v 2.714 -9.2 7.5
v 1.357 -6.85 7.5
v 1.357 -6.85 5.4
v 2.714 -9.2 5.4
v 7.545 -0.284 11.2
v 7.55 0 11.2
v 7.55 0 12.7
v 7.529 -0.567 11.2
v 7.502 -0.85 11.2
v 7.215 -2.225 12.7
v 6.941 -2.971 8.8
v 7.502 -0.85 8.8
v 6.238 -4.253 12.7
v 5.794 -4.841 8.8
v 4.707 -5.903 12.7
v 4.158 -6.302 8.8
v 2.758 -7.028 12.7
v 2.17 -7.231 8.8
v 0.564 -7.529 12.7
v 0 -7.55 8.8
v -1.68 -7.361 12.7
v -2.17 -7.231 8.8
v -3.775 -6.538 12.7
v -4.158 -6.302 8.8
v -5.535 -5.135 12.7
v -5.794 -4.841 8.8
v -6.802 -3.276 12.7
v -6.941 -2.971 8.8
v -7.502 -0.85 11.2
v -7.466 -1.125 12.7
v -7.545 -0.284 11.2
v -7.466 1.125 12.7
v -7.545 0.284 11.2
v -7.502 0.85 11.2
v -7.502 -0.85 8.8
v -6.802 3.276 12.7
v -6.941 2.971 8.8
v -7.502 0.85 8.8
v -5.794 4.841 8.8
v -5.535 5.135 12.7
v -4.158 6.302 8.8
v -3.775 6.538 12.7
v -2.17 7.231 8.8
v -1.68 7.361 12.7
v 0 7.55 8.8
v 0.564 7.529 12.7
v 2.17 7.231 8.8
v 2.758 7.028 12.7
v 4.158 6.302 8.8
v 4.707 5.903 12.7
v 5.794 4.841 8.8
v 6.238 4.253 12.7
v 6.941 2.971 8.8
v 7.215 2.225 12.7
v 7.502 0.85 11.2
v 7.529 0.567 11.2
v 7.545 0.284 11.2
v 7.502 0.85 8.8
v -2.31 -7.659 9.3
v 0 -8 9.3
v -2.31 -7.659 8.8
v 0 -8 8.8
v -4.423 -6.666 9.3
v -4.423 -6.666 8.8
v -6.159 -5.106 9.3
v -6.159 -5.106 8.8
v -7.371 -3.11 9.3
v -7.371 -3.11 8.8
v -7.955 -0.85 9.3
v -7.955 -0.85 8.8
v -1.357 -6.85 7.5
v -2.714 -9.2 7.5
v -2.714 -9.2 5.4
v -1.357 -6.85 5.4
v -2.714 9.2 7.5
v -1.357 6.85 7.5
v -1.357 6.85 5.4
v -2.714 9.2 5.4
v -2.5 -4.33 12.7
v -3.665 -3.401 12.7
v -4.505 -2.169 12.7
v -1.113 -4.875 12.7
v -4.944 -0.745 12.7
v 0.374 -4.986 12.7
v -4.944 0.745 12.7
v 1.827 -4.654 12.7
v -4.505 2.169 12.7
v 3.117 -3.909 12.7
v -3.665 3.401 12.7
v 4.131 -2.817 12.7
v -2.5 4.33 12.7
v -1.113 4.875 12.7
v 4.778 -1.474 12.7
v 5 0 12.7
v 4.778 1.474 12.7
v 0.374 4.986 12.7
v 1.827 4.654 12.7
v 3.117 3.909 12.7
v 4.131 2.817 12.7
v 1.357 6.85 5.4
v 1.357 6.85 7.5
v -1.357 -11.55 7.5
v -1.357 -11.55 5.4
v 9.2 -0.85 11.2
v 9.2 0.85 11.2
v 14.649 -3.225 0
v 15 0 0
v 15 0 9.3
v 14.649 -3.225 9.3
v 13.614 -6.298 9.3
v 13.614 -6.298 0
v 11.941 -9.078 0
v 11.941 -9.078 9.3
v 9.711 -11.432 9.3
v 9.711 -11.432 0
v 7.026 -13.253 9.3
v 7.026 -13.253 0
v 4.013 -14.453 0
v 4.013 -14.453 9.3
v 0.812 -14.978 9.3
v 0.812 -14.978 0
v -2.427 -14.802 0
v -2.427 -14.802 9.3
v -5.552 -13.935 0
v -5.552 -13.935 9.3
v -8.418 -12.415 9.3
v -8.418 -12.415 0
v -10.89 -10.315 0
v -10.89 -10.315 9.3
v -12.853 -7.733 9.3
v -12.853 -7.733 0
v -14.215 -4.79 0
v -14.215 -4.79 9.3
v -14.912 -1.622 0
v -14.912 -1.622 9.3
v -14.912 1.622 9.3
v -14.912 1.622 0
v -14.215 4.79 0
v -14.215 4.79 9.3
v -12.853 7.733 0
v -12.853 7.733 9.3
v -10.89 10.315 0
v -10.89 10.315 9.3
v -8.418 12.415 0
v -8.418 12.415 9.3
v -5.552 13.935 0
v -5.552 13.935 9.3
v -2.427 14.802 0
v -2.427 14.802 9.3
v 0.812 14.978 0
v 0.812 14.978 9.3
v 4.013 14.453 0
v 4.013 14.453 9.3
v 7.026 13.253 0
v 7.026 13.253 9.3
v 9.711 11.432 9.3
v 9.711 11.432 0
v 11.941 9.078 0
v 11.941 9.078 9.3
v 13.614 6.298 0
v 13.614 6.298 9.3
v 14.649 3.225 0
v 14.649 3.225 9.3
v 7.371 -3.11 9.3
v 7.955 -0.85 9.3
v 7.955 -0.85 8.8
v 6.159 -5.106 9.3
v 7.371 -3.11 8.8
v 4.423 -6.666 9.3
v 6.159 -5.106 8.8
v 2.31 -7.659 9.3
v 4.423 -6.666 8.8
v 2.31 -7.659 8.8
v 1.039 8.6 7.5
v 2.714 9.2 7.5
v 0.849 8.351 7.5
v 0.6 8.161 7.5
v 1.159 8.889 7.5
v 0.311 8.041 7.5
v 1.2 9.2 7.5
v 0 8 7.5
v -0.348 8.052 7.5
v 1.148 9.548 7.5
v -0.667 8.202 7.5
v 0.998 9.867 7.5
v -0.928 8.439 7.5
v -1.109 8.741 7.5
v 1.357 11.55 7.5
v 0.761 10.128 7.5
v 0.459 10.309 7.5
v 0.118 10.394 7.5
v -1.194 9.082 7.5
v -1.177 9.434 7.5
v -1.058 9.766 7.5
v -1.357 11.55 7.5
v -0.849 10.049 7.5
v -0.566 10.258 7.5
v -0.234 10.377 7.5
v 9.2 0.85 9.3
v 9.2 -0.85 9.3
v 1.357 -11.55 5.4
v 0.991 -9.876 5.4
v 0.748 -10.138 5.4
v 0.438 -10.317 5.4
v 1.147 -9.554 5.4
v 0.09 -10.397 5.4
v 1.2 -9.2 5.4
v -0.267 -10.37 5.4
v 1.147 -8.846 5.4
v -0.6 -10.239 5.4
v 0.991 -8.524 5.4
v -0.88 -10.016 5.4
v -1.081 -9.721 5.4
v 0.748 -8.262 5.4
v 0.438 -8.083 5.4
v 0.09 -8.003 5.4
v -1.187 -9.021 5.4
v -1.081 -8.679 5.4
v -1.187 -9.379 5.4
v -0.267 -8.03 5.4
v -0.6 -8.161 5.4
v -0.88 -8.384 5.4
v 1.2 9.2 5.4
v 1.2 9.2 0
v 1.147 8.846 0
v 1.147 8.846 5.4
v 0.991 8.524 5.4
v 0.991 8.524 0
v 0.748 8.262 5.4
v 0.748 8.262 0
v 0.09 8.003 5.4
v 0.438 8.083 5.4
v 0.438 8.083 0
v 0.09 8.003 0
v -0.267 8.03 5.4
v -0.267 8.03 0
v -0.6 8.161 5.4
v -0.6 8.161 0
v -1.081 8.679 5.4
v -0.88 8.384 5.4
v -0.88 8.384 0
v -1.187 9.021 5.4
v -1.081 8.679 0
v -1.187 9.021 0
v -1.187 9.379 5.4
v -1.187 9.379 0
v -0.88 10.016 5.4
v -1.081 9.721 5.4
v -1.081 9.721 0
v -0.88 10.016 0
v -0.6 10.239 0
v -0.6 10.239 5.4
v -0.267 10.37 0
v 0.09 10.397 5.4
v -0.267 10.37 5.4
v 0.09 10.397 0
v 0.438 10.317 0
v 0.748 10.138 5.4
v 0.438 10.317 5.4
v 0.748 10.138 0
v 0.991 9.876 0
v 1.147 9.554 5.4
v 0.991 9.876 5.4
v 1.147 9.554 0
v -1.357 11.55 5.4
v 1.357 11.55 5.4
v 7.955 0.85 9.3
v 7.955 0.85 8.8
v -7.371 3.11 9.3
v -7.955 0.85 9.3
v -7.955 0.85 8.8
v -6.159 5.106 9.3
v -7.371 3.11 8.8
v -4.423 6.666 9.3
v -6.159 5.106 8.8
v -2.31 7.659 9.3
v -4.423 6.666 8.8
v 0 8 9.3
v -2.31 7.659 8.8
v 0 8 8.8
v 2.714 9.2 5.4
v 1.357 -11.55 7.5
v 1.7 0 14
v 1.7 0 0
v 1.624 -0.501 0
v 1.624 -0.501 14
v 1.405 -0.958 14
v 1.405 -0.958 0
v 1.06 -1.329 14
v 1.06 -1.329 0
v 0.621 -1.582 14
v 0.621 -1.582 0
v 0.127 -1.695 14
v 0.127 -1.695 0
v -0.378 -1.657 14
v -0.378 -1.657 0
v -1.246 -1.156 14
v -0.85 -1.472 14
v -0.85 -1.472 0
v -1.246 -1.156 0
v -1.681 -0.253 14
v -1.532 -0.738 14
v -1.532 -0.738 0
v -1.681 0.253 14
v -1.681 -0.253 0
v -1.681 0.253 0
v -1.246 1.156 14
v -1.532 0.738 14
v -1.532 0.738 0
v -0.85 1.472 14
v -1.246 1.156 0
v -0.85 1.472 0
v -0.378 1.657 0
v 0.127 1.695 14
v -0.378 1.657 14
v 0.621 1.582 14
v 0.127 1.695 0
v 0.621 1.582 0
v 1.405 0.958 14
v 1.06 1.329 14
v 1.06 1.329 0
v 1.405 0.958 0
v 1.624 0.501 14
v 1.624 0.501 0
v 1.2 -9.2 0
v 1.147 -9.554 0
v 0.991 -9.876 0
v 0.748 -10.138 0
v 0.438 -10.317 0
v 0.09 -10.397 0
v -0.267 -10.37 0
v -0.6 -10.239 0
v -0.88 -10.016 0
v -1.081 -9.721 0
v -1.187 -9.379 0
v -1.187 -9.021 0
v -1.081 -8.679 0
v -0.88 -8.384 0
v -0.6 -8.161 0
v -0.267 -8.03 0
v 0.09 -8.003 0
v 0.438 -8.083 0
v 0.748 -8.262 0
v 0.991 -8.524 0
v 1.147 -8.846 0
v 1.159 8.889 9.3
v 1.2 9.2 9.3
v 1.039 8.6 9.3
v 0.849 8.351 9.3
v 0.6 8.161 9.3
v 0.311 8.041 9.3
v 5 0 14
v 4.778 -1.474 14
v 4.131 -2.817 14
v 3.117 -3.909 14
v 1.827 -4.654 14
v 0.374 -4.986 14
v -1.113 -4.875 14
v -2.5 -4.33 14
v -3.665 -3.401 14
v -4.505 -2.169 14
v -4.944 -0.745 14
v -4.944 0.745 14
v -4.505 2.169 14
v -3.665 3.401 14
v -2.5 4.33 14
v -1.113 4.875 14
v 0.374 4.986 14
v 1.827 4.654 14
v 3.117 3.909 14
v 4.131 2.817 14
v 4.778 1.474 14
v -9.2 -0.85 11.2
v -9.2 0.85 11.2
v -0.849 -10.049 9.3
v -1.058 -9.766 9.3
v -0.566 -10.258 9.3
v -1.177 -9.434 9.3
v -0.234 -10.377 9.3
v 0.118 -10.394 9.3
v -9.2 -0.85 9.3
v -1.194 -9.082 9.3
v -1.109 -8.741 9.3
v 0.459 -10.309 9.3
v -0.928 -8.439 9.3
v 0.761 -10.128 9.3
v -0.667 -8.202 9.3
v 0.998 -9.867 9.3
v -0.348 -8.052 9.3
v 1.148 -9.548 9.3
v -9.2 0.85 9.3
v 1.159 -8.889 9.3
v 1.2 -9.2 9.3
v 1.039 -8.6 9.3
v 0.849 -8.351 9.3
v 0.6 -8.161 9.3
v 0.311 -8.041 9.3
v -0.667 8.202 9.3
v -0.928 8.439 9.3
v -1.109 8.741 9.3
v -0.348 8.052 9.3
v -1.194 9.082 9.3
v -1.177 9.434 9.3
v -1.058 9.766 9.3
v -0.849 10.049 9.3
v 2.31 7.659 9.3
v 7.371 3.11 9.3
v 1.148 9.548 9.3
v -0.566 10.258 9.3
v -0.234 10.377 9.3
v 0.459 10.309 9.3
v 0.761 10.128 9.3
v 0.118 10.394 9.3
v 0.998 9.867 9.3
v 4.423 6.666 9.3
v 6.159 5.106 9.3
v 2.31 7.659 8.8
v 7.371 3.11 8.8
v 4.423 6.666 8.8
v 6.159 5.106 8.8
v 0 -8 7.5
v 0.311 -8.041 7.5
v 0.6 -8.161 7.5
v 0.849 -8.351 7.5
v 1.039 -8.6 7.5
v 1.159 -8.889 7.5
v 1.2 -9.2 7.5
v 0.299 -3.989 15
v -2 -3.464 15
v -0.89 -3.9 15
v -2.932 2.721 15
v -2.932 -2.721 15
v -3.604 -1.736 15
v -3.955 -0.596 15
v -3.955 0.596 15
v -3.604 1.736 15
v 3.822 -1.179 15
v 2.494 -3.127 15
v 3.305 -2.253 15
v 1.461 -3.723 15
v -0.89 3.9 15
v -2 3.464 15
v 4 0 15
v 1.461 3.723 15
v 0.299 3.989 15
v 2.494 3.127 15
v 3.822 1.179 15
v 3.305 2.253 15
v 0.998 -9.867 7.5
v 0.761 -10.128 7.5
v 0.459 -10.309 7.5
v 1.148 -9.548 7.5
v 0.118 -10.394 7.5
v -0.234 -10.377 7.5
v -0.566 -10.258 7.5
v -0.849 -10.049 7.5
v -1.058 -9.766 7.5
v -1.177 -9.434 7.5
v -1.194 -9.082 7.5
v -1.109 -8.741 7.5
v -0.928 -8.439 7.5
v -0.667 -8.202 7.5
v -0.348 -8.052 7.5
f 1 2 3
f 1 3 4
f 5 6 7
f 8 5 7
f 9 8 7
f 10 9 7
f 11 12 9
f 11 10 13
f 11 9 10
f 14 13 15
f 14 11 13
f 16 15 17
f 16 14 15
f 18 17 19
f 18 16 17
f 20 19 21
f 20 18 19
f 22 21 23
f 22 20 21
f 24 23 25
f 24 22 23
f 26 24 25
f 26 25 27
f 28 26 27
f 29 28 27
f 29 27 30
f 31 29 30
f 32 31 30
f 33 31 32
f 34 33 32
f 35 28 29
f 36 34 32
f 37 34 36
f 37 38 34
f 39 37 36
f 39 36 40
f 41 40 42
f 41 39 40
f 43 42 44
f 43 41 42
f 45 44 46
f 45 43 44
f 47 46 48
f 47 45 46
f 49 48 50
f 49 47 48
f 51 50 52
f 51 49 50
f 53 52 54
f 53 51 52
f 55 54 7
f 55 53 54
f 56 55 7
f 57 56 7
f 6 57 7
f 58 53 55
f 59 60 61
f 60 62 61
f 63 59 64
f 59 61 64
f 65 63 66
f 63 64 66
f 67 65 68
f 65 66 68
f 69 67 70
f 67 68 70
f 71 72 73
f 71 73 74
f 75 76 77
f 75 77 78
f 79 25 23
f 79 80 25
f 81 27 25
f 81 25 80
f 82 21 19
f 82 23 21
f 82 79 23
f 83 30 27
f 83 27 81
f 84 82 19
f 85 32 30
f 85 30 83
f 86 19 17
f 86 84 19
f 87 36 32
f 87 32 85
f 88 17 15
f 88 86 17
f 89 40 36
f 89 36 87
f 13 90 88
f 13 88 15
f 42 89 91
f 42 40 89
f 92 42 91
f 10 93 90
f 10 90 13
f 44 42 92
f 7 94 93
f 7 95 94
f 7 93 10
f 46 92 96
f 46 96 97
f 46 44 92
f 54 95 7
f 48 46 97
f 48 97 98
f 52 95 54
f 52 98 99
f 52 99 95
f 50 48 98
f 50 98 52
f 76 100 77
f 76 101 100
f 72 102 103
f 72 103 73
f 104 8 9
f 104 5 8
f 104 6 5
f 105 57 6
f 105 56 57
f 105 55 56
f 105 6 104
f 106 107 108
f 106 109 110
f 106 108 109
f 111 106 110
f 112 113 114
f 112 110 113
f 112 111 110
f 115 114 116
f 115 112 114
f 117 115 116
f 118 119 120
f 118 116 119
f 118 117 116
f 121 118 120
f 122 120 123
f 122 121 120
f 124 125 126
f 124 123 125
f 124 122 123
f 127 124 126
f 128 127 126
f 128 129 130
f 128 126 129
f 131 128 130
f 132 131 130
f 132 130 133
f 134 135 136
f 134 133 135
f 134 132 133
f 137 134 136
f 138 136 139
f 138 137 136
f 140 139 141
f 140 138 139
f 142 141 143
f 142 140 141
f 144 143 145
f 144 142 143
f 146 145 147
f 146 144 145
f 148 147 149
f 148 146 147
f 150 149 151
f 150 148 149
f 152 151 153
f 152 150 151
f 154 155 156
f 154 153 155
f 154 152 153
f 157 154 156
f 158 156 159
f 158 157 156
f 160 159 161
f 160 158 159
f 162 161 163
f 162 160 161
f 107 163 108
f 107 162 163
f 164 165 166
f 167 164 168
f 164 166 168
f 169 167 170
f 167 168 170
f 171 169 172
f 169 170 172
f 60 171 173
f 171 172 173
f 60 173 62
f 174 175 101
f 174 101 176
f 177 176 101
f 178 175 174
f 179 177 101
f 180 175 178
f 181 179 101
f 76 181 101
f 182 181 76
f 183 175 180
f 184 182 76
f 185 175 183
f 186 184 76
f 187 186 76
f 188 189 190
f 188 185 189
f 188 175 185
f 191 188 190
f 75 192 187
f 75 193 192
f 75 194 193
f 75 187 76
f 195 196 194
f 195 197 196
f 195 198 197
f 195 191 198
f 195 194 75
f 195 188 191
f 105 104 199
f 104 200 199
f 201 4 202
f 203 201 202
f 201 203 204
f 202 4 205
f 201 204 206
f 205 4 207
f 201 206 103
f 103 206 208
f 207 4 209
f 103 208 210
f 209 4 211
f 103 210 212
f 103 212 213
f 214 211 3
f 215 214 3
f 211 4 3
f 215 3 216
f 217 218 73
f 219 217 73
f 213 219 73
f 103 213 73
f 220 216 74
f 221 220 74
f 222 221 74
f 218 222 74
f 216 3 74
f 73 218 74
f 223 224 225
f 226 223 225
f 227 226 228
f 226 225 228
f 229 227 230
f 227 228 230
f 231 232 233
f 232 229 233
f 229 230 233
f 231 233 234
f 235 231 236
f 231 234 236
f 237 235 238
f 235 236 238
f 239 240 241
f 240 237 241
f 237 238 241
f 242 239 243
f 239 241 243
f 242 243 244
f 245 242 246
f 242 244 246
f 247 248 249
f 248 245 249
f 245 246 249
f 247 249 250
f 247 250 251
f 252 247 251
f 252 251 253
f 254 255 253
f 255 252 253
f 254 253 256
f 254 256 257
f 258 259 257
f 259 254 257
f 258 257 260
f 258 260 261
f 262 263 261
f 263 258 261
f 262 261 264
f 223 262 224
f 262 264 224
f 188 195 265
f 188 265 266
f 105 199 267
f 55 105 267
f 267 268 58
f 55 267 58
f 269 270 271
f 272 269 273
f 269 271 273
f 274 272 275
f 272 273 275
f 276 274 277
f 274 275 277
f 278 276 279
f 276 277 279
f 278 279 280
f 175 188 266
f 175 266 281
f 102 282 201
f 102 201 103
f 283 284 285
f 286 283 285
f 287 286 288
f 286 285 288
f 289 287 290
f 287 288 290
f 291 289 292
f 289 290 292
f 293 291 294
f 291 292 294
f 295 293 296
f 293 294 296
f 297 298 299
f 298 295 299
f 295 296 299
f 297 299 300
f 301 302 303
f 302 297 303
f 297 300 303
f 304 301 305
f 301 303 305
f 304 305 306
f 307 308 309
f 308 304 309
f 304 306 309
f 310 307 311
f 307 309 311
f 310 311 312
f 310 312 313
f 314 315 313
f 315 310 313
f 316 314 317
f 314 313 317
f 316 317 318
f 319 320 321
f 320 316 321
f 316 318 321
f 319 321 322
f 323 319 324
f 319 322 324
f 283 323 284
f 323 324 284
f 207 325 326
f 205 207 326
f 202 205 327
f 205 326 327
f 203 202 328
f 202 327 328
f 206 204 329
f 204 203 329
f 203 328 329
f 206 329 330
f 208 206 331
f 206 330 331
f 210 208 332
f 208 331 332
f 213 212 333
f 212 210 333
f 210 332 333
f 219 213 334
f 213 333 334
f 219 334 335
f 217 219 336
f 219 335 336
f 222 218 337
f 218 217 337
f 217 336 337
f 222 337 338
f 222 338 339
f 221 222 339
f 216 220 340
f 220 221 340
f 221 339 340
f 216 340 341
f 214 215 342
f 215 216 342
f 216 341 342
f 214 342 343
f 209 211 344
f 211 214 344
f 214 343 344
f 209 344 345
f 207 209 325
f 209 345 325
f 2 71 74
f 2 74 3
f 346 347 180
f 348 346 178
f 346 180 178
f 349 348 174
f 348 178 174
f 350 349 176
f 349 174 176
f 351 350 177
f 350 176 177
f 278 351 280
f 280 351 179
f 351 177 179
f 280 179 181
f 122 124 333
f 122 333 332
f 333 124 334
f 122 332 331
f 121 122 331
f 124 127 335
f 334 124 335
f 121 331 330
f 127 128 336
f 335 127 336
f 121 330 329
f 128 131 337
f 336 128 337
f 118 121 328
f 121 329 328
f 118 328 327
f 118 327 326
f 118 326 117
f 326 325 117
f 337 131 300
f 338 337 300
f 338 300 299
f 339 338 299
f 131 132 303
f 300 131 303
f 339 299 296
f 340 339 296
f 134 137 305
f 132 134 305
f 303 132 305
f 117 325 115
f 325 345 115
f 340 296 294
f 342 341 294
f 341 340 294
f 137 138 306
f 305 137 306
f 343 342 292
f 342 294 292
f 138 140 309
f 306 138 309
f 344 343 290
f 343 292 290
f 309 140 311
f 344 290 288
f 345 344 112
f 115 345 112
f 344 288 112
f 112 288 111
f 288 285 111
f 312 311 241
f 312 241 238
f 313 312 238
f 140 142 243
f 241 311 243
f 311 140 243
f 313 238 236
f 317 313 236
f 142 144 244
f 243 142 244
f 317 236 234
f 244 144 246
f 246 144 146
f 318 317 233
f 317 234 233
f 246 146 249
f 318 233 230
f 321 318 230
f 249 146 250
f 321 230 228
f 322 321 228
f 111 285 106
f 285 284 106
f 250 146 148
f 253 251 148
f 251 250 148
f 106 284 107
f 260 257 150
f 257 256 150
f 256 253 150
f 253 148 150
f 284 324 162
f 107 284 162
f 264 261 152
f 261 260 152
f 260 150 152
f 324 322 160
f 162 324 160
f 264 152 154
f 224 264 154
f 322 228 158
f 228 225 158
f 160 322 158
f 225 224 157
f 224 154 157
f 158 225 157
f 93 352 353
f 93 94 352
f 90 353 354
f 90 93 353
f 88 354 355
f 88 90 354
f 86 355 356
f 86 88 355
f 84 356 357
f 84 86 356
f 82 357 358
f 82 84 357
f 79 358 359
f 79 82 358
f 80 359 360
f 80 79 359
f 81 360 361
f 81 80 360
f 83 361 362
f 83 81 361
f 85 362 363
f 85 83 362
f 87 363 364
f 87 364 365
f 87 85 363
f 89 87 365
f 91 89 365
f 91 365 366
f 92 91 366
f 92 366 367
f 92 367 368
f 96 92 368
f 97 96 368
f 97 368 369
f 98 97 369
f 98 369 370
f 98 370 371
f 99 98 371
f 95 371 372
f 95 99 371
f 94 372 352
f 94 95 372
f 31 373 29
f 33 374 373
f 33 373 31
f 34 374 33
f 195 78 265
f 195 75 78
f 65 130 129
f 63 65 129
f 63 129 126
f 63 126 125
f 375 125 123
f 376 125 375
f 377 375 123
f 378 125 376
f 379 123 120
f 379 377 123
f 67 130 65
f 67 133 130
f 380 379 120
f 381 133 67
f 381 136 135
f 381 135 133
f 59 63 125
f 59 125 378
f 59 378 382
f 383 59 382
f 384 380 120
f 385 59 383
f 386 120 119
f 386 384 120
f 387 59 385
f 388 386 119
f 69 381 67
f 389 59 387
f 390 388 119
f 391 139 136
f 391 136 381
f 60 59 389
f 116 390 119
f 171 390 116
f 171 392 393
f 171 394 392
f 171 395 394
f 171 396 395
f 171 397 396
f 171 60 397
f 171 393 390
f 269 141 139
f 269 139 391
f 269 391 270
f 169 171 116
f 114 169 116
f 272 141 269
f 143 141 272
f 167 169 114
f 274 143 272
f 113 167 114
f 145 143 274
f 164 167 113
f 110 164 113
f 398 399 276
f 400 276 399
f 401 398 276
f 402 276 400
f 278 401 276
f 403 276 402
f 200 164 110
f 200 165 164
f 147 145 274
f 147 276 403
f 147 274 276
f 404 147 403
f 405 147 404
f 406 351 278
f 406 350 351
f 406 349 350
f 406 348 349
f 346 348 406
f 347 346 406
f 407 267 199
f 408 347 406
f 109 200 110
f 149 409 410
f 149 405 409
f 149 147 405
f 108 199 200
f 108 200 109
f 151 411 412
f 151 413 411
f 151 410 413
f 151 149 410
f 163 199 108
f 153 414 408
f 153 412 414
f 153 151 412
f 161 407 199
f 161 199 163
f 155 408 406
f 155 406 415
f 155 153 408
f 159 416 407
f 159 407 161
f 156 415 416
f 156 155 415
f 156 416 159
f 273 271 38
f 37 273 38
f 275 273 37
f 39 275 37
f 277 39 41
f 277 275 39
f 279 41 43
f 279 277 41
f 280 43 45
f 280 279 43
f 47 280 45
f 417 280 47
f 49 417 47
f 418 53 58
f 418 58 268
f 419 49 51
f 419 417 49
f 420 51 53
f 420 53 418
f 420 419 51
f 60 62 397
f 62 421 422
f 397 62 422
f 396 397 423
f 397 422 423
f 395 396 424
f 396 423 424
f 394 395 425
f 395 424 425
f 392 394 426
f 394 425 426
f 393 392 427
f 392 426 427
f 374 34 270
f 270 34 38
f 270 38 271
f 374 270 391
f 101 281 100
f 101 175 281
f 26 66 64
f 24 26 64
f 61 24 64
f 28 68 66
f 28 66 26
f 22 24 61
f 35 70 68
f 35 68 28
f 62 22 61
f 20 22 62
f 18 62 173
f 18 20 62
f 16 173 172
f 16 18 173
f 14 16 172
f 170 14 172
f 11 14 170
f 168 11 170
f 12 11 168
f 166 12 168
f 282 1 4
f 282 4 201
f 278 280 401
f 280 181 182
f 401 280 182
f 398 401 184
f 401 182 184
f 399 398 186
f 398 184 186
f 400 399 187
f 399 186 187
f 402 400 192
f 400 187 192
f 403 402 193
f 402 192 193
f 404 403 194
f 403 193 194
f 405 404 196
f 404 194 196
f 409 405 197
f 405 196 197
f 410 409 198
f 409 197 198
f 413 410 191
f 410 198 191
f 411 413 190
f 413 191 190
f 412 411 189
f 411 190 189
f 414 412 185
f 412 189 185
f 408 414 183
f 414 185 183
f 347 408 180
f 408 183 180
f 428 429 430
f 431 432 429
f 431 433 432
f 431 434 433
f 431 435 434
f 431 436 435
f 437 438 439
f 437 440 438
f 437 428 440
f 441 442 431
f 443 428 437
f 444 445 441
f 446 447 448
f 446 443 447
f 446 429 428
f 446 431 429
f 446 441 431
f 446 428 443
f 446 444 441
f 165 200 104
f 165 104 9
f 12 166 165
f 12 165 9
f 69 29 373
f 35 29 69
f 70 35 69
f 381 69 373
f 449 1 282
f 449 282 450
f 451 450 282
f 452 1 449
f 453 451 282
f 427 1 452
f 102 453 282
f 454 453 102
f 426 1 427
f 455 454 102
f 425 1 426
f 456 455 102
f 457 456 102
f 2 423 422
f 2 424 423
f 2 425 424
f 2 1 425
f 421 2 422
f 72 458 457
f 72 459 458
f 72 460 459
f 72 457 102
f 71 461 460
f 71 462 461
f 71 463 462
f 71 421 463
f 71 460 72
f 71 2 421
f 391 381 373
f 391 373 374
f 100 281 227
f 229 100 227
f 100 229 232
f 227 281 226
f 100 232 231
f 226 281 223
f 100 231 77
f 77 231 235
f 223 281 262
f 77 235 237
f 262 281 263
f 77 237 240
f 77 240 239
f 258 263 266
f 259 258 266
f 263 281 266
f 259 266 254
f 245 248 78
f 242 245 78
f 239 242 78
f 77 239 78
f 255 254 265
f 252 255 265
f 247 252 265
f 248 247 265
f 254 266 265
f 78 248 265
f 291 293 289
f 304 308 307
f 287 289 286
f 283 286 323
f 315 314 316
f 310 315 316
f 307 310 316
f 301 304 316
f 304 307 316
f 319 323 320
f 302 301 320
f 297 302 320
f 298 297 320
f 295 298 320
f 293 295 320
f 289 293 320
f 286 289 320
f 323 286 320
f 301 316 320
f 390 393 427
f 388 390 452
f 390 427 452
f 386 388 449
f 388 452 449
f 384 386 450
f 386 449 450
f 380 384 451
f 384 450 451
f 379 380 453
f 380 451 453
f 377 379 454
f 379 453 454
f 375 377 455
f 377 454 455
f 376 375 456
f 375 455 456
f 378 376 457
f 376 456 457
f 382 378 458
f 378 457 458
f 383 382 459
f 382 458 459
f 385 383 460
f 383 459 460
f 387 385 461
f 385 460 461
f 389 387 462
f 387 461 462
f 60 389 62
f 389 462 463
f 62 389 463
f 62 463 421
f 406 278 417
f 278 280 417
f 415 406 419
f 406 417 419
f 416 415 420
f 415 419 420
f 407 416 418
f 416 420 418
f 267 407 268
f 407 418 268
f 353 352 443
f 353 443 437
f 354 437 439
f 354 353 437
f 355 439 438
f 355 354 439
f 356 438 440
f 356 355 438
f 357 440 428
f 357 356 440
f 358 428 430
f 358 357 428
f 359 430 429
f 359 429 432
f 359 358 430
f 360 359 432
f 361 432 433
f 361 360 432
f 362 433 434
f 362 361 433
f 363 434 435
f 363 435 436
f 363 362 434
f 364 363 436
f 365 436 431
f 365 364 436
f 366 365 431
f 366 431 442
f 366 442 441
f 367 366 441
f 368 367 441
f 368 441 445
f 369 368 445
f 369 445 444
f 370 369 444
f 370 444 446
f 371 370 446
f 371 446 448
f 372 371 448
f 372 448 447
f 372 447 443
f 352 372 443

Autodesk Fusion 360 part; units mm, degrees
sketch "Skizze1" plane through (0, 0, 0) normal (0, 0, 1) x (1, 0, 0)
  circle A0 centre (0, 0) radius 15
  circle A1 centre (0, 0) radius 1.7
  circle A2 centre (0, 0) radius 7.55
  line L0 (0, 17.9163) -> (0, -17.3071) construction
  circle A3 centre (0, 0) radius 9.2 construction
  circle A4 centre (0, 9.2) radius 1.2
  circle A5 centre (0, -9.2) radius 1.2
  circle A6 centre (0, 0) radius 5
  circle A7 centre (0, 0) radius 14.1421 construction
  line L1 (9.2, -0.85) -> (7.502, -0.85)
  line L2 (9.2, 0.85) -> (7.502, 0.85)
  line L3 (19.7442, 0) -> (-23.5704, 0) construction
  line L4 (-4.9272, -0.85) -> (-9.2, -0.85)
  line L5 (-4.9272, 0.85) -> (-9.2, 0.85)
  line L6 (-9.2, -0.85) -> (-9.2, 0.85)
  line L7 (9.2, -0.85) -> (9.2, 0.85)
  circle A8 centre (0, 0) radius 8
  point P0 (0, 9.2)
  point P1 (0, -9.2)
  dimension "d1" = 30
  dimension "d2" = 3.4
  dimension "d3" = 15.1
  dimension "d19" = 18.4
  dimension "d20" = 2.4
  dimension "d21" = 2.4
  dimension "d25" = 10
  dimension "d43" = 28.2843
  dimension "d58" = 0.85
  dimension "d59" = 0.85
  dimension "d60" = 0.85
  dimension "d61" = 0.85
  dimension "d62" = 9.2
  dimension "d63" = 9.2
  dimension "d66" = 16
extrude "Extrusion1" add sketch "Skizze1" along normal blind 15 contours A1 | A6 makes body 1
extrude "Extrusion2" cut sketch "Skizze1" along normal blind 14 contours A1 bodies 1
extrude "Extrusion5" add sketch "Skizze1" along normal blind 12.7 contours A2 A6 L4 L5 | A2 A6 L4 L5 bodies 1
extrude "Extrusion9" add sketch "Skizze1" along normal blind 11.2 contours A2 L1 L2 A8 | A2 L4 L5 A8 | L1 L2 L7 A8 | L4 L5 L6 A8 bodies 1
extrude "Extrusion3" add sketch "Skizze1" along normal blind 9.3 separate body contours A0 | A2 L1 L2 A8 | A2 L4 L5 A8 | L1 L2 L7 A8 | L4 L5 L6 A8 makes body 2
extrude "Extrusion10" add sketch "Skizze1" along normal blind 8.8 contours A2 L2 L5 A8 | A2 L1 L4 A8 bodies 1 2
ref_plane "Arbeitsebene1" through (0, 0, 7.5) normal (0, 0, -1) x (-1, 0, 0)
sketch "Skizze2" plane through (0, 0, 7.5) normal (0, 0, -1) x (-1, 0, 0)
  line L0 (0, 19.4975) -> (0, -17.4097) construction
  line L1 (-20.2047, 0) -> (24.515, 0) construction
  circle A0 centre (0, 0) radius 9.2 construction
  line L2 (-1.3568, 11.55) -> (-2.7135, 9.2)
  line L3 (-2.7135, 9.2) -> (-1.3568, 6.85)
  line L4 (-1.3568, 6.85) -> (1.3568, 6.85)
  line L5 (1.3568, 6.85) -> (2.7135, 9.2)
  line L6 (2.7135, 9.2) -> (1.3568, 11.55)
  line L7 (1.3568, 11.55) -> (-1.3568, 11.55)
  line L8 (1.3568, -11.55) -> (2.7135, -9.2)
  line L9 (2.7135, -9.2) -> (1.3568, -6.85)
  line L10 (1.3568, -6.85) -> (-1.3568, -6.85)
  line L11 (-1.3568, -6.85) -> (-2.7135, -9.2)
  line L12 (-2.7135, -9.2) -> (-1.3568, -11.55)
  line L13 (-1.3568, -11.55) -> (1.3568, -11.55)
  point P0 (0, 9.2)
  point P1 (0, -9.2)
  point P2 (0, 9.2)
  point P3 (0, -9.2)
  dimension "d9" = 18.4
  dimension "d10" = 4.7
  dimension "d11" = 4.7
extrude "Extrusion4" cut sketch "Skizze2" along normal blind 2.1 bodies 1
chamfer "Fase2" distance 1 angle 45 1 edges at (-4.6616, -1.8081, 15) on bodies 1
